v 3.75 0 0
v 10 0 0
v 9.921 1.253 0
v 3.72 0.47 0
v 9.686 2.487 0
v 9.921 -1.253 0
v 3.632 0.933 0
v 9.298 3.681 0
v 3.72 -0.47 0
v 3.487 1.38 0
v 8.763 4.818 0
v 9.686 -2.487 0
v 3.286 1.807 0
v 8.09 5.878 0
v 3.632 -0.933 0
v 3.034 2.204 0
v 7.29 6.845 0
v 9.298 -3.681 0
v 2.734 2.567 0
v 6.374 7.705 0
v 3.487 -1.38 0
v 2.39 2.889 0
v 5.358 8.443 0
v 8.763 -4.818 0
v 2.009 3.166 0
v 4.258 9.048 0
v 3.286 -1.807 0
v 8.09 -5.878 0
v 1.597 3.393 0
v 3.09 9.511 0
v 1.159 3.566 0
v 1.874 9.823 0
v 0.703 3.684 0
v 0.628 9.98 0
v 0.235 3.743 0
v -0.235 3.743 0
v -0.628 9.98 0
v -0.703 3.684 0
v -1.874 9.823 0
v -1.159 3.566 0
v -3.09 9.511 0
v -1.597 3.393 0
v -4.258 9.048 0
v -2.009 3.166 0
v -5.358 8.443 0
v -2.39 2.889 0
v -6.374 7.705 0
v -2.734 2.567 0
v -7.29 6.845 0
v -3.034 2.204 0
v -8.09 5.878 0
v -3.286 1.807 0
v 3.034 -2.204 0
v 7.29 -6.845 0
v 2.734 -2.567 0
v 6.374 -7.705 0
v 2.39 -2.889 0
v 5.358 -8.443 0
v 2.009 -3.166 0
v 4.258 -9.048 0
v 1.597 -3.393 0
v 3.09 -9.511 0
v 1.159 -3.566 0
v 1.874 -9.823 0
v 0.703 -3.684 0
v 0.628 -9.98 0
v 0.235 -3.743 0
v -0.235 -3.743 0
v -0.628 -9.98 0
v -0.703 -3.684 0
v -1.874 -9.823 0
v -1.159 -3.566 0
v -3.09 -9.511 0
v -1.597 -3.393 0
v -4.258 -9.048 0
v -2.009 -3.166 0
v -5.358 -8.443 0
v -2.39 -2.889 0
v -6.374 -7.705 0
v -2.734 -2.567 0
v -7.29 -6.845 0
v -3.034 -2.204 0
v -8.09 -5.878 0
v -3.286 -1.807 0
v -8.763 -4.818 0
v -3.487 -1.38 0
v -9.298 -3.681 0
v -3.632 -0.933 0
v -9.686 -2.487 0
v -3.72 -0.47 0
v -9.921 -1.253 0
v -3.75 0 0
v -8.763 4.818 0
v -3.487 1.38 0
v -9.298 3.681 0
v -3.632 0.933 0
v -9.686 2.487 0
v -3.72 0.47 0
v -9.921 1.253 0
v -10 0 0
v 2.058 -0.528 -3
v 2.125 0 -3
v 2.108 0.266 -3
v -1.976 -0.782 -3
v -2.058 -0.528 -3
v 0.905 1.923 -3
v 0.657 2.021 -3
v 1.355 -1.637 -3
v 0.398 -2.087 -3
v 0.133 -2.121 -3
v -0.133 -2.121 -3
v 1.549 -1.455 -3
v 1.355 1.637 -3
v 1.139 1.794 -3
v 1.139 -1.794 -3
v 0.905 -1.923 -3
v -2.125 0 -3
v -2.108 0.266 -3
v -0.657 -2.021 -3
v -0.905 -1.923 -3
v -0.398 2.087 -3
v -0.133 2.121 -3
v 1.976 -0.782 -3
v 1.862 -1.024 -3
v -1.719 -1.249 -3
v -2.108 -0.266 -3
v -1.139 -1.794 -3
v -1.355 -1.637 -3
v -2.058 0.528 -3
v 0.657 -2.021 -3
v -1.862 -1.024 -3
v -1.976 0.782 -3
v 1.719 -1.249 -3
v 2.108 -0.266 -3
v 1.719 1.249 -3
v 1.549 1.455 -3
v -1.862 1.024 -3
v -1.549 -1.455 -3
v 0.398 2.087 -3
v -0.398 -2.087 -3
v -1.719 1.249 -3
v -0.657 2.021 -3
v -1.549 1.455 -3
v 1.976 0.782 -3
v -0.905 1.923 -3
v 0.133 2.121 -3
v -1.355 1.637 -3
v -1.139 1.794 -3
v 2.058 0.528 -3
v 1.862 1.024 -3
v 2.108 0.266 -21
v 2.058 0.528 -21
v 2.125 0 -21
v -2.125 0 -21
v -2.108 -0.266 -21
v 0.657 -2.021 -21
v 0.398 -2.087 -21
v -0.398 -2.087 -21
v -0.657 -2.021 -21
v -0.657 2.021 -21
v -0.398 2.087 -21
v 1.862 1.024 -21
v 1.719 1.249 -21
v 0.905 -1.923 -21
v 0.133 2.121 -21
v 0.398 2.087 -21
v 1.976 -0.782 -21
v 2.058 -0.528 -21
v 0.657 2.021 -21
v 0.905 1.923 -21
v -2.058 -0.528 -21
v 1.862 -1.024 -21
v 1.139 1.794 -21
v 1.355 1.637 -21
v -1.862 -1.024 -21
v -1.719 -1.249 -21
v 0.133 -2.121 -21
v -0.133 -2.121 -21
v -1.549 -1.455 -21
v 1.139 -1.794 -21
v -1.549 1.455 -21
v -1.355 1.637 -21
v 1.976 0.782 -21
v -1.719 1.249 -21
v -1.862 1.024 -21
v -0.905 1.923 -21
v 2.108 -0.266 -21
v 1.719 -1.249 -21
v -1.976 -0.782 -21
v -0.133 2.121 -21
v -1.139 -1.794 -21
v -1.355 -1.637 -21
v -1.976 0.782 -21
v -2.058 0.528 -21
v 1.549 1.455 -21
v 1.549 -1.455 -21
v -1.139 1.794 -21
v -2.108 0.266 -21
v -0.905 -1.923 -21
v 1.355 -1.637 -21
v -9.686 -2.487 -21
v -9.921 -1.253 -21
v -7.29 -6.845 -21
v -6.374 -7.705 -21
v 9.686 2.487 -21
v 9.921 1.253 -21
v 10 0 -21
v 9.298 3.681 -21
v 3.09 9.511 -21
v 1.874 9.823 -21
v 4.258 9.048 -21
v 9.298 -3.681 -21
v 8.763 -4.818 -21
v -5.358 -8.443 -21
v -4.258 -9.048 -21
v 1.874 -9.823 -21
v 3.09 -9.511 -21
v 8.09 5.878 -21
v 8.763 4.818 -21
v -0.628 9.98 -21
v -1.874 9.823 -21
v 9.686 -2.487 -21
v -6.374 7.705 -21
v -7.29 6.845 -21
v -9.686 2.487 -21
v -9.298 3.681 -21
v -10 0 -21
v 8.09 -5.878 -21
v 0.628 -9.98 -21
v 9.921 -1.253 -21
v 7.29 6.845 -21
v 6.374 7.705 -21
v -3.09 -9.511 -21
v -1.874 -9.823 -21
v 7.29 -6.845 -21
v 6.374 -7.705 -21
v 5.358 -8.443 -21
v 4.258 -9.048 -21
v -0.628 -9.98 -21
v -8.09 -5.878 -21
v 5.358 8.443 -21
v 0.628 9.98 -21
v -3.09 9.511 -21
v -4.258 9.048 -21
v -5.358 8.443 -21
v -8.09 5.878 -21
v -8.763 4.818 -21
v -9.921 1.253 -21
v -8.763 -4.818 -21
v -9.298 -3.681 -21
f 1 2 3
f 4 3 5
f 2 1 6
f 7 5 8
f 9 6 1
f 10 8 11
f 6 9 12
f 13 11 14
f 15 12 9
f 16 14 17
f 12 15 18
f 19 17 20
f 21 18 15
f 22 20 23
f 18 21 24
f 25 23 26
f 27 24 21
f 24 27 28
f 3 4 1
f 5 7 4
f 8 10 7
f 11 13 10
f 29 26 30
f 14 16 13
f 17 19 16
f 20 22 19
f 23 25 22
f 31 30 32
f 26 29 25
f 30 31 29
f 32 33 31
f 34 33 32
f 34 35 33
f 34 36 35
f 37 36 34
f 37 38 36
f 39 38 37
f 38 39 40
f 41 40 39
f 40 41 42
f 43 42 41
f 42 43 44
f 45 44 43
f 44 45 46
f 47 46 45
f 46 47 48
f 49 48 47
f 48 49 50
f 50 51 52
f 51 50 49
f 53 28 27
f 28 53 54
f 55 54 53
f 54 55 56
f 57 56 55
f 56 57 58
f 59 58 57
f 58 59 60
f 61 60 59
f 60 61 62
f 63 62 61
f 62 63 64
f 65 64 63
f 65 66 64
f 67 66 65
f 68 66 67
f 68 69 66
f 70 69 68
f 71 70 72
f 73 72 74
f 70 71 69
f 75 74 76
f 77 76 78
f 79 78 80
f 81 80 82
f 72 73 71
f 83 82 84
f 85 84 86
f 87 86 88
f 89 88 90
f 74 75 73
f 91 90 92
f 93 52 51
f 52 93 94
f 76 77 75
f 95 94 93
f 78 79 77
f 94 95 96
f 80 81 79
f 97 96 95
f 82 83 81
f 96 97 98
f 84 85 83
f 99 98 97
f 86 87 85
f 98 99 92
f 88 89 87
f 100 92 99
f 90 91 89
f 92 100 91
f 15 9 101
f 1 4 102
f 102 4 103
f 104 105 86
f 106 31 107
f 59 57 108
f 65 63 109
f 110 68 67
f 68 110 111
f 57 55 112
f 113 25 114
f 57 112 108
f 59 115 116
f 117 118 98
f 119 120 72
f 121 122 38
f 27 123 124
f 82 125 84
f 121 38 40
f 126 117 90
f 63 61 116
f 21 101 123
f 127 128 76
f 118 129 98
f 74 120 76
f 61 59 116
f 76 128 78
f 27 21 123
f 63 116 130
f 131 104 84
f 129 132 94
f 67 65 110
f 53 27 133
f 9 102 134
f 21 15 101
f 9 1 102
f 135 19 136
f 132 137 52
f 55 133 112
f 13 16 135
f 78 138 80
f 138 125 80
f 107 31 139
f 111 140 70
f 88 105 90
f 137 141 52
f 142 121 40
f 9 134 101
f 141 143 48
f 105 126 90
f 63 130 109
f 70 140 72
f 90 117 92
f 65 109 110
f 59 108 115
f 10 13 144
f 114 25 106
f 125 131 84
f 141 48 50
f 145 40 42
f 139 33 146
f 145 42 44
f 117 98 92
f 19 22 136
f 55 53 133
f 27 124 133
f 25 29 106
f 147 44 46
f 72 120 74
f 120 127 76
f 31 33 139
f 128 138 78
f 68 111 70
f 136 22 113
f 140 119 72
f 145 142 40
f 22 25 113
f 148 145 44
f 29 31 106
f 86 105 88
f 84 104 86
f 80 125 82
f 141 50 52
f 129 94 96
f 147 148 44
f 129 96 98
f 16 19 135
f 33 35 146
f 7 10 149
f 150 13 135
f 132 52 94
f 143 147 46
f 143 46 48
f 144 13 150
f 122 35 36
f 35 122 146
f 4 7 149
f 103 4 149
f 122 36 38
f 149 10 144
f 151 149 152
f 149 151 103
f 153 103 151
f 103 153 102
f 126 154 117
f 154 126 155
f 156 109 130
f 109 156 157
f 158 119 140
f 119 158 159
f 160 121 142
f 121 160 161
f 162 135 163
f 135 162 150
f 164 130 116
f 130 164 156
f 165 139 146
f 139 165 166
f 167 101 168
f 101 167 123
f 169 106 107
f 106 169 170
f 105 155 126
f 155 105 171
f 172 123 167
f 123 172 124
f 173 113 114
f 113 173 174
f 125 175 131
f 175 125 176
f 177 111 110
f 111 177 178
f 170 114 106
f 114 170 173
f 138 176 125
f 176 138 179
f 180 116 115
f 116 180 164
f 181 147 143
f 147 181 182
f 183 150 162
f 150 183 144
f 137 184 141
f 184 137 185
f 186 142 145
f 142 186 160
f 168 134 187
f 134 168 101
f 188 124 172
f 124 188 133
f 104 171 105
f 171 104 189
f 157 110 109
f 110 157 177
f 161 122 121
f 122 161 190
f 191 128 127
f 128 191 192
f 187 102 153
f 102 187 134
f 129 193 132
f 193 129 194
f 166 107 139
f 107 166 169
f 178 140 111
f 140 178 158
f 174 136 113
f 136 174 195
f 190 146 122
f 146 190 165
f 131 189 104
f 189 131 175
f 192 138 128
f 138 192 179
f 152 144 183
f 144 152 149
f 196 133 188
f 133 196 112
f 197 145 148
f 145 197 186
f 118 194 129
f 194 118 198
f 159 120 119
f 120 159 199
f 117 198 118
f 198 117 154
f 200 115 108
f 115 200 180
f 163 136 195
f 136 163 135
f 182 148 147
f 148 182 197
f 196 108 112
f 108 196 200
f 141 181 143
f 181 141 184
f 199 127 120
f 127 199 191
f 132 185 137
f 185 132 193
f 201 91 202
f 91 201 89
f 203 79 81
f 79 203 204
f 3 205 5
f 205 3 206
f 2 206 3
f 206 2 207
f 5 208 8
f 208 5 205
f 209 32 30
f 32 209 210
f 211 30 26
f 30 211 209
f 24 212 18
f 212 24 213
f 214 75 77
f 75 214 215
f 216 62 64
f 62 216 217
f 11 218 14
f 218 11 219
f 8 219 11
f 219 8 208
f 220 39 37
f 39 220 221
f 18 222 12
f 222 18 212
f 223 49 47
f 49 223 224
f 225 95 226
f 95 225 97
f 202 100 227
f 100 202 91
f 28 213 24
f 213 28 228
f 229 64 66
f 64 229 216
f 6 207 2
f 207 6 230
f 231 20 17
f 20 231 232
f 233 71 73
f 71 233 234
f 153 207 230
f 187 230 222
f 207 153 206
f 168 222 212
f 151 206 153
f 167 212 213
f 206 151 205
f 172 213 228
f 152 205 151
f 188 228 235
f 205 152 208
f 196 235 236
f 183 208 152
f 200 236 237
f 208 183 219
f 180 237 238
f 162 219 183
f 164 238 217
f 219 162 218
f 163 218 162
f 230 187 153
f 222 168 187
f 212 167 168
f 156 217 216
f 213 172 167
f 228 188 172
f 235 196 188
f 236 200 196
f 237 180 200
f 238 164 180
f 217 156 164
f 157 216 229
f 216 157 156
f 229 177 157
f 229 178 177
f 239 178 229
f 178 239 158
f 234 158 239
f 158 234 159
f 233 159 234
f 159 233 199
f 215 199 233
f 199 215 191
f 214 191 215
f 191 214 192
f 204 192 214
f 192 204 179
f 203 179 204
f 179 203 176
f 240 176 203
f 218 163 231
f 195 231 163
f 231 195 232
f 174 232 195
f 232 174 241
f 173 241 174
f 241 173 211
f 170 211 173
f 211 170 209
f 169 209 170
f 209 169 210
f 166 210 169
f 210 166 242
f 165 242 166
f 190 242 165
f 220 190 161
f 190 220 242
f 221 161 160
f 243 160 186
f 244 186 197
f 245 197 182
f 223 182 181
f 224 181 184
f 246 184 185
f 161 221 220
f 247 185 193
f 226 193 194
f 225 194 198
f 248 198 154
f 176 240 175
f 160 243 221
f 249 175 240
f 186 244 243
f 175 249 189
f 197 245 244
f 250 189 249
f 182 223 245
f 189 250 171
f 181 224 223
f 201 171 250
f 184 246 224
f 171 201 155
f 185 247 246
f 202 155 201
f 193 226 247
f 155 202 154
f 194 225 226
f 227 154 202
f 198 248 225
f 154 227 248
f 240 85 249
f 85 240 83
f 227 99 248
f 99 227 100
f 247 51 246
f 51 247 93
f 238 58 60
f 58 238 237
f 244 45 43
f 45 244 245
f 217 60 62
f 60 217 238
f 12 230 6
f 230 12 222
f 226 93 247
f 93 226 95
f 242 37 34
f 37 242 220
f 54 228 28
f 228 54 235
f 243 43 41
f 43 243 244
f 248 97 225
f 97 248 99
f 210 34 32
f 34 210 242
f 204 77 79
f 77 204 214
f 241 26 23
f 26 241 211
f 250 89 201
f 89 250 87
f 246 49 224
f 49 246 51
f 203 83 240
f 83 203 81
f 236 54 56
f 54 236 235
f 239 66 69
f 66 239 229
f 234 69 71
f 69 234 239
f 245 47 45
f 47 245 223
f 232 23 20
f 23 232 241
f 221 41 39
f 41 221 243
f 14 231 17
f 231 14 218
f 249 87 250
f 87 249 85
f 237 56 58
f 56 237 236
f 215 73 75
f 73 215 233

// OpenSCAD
$fn = 50;

difference() {
	union() {
		translate(v = [0, 0, -21.0]) {
			cylinder(h = 21, r = 10.0);
		}
	}
	union() {
		translate(v = [0, 0, 0]) {
			rotate(a = [0, 0, 0]) {
				difference() {
					union() {
						translate(v = [0, 0, -24.0]) {
							cylinder(h = 24, r = 2.0);
						}
						translate(v = [0, 0, -3]) {
							cylinder(h = 3, r1 = 2.125, r2 = 3.75);
						}
						translate(v = [0, 0, -24.0]) {
							cylinder(h = 24, r = 2.125);
						}
						translate(v = [0, 0, -24.0]) {
							cylinder(h = 24, r = 2.0);
						}
					}
					union();
				}
			}
		}
	}
}
